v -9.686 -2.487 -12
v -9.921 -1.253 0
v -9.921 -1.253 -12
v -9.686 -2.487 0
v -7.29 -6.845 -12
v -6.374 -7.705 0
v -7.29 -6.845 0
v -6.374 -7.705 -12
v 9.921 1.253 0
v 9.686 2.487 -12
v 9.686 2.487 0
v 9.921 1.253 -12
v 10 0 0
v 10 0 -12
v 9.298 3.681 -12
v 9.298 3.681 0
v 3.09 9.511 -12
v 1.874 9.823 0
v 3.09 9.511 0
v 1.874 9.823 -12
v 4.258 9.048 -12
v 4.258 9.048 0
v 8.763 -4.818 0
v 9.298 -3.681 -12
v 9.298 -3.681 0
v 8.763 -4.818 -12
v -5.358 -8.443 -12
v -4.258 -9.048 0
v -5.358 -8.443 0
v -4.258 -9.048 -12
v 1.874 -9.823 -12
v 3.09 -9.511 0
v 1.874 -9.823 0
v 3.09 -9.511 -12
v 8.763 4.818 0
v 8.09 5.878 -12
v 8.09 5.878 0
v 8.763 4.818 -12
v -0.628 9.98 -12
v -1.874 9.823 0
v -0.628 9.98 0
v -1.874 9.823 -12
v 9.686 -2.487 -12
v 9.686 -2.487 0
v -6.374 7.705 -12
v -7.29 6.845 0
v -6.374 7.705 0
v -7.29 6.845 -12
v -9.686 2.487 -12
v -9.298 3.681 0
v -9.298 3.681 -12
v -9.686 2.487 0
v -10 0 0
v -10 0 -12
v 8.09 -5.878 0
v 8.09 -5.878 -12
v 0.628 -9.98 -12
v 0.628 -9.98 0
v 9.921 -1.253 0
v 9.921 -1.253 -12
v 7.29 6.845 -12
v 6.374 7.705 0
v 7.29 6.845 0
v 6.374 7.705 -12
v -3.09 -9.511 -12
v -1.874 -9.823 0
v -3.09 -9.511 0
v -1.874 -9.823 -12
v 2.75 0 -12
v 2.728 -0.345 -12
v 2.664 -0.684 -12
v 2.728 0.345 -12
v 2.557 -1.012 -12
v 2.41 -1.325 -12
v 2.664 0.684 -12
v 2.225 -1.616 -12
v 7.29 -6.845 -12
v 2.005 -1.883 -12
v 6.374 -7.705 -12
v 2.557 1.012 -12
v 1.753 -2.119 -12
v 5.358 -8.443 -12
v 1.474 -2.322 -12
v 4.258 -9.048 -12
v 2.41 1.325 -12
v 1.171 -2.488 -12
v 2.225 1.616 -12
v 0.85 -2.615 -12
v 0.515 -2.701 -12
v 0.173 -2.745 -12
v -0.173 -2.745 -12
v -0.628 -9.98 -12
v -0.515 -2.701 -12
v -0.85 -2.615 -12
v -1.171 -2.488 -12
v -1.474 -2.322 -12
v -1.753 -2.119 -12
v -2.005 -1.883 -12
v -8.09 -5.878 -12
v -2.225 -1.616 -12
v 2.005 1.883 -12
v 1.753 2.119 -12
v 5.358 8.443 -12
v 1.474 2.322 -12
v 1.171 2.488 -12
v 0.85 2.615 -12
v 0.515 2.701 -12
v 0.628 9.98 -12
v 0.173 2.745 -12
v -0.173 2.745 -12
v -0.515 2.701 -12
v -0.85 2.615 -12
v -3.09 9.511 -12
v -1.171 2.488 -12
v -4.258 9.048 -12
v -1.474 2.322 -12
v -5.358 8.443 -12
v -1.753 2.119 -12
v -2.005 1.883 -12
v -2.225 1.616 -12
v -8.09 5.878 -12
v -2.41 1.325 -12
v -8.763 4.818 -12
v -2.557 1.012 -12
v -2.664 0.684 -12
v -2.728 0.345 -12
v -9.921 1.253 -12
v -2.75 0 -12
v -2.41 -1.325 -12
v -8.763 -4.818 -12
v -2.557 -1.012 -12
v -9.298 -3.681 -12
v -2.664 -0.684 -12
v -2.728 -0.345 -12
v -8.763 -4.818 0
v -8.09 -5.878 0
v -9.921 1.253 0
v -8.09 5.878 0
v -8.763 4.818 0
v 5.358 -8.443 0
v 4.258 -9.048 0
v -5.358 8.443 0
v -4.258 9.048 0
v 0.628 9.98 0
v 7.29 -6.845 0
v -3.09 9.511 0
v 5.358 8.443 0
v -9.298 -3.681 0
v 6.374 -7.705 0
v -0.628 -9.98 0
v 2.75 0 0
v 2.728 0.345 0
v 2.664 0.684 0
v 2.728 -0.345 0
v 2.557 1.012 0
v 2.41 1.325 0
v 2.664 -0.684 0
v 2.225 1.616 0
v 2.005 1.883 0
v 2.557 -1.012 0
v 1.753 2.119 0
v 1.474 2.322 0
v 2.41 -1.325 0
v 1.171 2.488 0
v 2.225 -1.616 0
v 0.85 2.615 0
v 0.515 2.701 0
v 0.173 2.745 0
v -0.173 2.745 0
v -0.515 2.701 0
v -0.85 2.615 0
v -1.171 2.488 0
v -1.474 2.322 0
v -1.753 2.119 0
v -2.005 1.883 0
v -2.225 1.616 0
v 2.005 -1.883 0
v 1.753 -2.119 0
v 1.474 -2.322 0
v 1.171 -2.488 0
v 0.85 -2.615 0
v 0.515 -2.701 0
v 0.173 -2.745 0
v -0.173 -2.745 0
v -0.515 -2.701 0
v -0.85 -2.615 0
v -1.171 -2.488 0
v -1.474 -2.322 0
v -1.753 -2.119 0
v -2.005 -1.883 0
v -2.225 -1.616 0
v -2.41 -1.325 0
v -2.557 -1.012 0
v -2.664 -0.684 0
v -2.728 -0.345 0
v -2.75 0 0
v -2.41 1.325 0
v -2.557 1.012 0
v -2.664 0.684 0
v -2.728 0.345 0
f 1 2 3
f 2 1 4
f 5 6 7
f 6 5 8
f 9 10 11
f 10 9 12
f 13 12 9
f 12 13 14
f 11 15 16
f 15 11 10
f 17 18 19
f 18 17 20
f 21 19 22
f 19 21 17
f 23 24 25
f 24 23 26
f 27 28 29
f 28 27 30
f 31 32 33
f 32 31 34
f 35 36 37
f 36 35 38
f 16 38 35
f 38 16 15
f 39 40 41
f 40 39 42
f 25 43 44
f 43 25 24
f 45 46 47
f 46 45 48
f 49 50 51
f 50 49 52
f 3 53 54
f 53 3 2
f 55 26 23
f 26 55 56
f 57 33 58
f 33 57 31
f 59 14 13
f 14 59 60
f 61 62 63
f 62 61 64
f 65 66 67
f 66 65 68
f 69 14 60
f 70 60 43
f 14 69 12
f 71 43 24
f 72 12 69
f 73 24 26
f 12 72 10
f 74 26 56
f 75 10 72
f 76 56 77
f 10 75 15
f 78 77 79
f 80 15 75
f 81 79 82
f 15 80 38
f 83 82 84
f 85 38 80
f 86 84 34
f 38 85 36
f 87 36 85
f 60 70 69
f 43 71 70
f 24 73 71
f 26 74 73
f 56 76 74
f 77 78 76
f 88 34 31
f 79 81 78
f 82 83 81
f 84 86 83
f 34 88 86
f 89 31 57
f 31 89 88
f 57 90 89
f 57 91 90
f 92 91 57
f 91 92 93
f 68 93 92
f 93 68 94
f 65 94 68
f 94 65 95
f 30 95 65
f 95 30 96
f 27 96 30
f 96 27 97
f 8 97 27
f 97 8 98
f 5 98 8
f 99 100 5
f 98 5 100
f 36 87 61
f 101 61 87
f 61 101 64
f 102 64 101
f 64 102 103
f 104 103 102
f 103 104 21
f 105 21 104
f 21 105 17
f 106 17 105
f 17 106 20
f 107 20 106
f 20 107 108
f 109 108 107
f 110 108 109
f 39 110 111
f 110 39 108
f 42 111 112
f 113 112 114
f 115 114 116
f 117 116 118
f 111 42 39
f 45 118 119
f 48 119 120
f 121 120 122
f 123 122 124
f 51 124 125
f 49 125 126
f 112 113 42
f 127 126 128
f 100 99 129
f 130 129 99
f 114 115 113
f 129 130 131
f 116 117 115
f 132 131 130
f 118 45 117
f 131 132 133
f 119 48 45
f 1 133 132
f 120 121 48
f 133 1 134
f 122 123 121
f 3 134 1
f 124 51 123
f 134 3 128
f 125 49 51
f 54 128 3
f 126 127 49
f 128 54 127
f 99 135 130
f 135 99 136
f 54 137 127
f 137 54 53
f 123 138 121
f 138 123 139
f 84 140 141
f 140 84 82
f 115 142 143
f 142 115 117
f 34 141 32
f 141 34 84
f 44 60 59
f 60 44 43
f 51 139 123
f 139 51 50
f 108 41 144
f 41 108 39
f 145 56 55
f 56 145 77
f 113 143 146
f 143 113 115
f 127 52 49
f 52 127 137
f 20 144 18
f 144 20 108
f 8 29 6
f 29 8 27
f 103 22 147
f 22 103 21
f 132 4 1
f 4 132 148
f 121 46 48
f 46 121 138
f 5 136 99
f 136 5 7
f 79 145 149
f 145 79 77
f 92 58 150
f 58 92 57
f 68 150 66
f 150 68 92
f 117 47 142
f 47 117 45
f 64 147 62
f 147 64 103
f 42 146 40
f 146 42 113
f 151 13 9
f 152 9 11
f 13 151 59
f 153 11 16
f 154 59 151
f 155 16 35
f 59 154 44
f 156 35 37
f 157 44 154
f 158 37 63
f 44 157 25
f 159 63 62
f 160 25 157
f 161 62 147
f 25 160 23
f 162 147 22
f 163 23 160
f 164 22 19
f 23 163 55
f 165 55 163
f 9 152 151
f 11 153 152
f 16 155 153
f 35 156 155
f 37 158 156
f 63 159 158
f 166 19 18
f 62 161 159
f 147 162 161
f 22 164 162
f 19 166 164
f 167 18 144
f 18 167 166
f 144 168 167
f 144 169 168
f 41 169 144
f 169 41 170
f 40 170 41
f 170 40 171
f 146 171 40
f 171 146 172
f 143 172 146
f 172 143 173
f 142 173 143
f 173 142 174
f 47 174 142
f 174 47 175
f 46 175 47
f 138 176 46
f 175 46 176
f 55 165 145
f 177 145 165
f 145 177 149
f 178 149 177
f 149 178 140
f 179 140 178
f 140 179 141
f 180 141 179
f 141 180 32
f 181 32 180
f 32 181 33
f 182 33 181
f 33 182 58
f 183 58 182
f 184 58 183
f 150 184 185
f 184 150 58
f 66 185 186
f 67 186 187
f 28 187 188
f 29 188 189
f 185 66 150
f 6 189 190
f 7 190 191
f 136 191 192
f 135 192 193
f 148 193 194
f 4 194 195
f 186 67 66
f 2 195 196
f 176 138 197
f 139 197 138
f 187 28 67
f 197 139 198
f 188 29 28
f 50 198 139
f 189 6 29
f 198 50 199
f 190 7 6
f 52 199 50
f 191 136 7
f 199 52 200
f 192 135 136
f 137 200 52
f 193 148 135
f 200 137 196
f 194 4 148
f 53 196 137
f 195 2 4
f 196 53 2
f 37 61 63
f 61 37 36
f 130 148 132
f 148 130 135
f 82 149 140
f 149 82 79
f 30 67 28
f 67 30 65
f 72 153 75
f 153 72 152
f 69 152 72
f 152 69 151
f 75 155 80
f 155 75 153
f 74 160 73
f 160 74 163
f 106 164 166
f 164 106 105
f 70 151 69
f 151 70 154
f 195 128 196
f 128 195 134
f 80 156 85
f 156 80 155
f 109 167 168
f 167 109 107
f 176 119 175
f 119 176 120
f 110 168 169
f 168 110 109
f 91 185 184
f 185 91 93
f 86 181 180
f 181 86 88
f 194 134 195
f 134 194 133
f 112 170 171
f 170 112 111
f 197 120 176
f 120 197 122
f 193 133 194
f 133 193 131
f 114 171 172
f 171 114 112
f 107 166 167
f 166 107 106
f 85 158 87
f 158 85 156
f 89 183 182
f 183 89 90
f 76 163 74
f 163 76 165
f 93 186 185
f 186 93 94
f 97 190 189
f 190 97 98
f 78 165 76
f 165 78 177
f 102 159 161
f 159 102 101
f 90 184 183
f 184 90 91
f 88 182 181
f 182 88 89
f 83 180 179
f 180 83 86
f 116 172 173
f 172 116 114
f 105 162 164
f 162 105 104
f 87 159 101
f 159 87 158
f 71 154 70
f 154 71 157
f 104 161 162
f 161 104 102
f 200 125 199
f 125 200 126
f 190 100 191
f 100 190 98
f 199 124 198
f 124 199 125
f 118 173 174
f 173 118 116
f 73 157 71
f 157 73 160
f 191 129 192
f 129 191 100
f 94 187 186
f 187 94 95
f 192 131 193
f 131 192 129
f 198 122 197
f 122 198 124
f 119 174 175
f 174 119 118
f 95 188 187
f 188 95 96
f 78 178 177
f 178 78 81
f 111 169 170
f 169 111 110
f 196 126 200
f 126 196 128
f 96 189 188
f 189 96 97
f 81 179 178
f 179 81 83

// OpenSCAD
$fn = 50;


difference() {
	union() {
		translate(v = [0, 0, -12.0000000000]) {
			cylinder(h = 12, r = 10.0000000000);
		}
		cylinder(h = 0, r = 20.0000000000);
	}
	union() {
		#translate(v = [0, 0, -12]) {
			cylinder(h = 12, r = 2.7500000000);
		}
	}
}
